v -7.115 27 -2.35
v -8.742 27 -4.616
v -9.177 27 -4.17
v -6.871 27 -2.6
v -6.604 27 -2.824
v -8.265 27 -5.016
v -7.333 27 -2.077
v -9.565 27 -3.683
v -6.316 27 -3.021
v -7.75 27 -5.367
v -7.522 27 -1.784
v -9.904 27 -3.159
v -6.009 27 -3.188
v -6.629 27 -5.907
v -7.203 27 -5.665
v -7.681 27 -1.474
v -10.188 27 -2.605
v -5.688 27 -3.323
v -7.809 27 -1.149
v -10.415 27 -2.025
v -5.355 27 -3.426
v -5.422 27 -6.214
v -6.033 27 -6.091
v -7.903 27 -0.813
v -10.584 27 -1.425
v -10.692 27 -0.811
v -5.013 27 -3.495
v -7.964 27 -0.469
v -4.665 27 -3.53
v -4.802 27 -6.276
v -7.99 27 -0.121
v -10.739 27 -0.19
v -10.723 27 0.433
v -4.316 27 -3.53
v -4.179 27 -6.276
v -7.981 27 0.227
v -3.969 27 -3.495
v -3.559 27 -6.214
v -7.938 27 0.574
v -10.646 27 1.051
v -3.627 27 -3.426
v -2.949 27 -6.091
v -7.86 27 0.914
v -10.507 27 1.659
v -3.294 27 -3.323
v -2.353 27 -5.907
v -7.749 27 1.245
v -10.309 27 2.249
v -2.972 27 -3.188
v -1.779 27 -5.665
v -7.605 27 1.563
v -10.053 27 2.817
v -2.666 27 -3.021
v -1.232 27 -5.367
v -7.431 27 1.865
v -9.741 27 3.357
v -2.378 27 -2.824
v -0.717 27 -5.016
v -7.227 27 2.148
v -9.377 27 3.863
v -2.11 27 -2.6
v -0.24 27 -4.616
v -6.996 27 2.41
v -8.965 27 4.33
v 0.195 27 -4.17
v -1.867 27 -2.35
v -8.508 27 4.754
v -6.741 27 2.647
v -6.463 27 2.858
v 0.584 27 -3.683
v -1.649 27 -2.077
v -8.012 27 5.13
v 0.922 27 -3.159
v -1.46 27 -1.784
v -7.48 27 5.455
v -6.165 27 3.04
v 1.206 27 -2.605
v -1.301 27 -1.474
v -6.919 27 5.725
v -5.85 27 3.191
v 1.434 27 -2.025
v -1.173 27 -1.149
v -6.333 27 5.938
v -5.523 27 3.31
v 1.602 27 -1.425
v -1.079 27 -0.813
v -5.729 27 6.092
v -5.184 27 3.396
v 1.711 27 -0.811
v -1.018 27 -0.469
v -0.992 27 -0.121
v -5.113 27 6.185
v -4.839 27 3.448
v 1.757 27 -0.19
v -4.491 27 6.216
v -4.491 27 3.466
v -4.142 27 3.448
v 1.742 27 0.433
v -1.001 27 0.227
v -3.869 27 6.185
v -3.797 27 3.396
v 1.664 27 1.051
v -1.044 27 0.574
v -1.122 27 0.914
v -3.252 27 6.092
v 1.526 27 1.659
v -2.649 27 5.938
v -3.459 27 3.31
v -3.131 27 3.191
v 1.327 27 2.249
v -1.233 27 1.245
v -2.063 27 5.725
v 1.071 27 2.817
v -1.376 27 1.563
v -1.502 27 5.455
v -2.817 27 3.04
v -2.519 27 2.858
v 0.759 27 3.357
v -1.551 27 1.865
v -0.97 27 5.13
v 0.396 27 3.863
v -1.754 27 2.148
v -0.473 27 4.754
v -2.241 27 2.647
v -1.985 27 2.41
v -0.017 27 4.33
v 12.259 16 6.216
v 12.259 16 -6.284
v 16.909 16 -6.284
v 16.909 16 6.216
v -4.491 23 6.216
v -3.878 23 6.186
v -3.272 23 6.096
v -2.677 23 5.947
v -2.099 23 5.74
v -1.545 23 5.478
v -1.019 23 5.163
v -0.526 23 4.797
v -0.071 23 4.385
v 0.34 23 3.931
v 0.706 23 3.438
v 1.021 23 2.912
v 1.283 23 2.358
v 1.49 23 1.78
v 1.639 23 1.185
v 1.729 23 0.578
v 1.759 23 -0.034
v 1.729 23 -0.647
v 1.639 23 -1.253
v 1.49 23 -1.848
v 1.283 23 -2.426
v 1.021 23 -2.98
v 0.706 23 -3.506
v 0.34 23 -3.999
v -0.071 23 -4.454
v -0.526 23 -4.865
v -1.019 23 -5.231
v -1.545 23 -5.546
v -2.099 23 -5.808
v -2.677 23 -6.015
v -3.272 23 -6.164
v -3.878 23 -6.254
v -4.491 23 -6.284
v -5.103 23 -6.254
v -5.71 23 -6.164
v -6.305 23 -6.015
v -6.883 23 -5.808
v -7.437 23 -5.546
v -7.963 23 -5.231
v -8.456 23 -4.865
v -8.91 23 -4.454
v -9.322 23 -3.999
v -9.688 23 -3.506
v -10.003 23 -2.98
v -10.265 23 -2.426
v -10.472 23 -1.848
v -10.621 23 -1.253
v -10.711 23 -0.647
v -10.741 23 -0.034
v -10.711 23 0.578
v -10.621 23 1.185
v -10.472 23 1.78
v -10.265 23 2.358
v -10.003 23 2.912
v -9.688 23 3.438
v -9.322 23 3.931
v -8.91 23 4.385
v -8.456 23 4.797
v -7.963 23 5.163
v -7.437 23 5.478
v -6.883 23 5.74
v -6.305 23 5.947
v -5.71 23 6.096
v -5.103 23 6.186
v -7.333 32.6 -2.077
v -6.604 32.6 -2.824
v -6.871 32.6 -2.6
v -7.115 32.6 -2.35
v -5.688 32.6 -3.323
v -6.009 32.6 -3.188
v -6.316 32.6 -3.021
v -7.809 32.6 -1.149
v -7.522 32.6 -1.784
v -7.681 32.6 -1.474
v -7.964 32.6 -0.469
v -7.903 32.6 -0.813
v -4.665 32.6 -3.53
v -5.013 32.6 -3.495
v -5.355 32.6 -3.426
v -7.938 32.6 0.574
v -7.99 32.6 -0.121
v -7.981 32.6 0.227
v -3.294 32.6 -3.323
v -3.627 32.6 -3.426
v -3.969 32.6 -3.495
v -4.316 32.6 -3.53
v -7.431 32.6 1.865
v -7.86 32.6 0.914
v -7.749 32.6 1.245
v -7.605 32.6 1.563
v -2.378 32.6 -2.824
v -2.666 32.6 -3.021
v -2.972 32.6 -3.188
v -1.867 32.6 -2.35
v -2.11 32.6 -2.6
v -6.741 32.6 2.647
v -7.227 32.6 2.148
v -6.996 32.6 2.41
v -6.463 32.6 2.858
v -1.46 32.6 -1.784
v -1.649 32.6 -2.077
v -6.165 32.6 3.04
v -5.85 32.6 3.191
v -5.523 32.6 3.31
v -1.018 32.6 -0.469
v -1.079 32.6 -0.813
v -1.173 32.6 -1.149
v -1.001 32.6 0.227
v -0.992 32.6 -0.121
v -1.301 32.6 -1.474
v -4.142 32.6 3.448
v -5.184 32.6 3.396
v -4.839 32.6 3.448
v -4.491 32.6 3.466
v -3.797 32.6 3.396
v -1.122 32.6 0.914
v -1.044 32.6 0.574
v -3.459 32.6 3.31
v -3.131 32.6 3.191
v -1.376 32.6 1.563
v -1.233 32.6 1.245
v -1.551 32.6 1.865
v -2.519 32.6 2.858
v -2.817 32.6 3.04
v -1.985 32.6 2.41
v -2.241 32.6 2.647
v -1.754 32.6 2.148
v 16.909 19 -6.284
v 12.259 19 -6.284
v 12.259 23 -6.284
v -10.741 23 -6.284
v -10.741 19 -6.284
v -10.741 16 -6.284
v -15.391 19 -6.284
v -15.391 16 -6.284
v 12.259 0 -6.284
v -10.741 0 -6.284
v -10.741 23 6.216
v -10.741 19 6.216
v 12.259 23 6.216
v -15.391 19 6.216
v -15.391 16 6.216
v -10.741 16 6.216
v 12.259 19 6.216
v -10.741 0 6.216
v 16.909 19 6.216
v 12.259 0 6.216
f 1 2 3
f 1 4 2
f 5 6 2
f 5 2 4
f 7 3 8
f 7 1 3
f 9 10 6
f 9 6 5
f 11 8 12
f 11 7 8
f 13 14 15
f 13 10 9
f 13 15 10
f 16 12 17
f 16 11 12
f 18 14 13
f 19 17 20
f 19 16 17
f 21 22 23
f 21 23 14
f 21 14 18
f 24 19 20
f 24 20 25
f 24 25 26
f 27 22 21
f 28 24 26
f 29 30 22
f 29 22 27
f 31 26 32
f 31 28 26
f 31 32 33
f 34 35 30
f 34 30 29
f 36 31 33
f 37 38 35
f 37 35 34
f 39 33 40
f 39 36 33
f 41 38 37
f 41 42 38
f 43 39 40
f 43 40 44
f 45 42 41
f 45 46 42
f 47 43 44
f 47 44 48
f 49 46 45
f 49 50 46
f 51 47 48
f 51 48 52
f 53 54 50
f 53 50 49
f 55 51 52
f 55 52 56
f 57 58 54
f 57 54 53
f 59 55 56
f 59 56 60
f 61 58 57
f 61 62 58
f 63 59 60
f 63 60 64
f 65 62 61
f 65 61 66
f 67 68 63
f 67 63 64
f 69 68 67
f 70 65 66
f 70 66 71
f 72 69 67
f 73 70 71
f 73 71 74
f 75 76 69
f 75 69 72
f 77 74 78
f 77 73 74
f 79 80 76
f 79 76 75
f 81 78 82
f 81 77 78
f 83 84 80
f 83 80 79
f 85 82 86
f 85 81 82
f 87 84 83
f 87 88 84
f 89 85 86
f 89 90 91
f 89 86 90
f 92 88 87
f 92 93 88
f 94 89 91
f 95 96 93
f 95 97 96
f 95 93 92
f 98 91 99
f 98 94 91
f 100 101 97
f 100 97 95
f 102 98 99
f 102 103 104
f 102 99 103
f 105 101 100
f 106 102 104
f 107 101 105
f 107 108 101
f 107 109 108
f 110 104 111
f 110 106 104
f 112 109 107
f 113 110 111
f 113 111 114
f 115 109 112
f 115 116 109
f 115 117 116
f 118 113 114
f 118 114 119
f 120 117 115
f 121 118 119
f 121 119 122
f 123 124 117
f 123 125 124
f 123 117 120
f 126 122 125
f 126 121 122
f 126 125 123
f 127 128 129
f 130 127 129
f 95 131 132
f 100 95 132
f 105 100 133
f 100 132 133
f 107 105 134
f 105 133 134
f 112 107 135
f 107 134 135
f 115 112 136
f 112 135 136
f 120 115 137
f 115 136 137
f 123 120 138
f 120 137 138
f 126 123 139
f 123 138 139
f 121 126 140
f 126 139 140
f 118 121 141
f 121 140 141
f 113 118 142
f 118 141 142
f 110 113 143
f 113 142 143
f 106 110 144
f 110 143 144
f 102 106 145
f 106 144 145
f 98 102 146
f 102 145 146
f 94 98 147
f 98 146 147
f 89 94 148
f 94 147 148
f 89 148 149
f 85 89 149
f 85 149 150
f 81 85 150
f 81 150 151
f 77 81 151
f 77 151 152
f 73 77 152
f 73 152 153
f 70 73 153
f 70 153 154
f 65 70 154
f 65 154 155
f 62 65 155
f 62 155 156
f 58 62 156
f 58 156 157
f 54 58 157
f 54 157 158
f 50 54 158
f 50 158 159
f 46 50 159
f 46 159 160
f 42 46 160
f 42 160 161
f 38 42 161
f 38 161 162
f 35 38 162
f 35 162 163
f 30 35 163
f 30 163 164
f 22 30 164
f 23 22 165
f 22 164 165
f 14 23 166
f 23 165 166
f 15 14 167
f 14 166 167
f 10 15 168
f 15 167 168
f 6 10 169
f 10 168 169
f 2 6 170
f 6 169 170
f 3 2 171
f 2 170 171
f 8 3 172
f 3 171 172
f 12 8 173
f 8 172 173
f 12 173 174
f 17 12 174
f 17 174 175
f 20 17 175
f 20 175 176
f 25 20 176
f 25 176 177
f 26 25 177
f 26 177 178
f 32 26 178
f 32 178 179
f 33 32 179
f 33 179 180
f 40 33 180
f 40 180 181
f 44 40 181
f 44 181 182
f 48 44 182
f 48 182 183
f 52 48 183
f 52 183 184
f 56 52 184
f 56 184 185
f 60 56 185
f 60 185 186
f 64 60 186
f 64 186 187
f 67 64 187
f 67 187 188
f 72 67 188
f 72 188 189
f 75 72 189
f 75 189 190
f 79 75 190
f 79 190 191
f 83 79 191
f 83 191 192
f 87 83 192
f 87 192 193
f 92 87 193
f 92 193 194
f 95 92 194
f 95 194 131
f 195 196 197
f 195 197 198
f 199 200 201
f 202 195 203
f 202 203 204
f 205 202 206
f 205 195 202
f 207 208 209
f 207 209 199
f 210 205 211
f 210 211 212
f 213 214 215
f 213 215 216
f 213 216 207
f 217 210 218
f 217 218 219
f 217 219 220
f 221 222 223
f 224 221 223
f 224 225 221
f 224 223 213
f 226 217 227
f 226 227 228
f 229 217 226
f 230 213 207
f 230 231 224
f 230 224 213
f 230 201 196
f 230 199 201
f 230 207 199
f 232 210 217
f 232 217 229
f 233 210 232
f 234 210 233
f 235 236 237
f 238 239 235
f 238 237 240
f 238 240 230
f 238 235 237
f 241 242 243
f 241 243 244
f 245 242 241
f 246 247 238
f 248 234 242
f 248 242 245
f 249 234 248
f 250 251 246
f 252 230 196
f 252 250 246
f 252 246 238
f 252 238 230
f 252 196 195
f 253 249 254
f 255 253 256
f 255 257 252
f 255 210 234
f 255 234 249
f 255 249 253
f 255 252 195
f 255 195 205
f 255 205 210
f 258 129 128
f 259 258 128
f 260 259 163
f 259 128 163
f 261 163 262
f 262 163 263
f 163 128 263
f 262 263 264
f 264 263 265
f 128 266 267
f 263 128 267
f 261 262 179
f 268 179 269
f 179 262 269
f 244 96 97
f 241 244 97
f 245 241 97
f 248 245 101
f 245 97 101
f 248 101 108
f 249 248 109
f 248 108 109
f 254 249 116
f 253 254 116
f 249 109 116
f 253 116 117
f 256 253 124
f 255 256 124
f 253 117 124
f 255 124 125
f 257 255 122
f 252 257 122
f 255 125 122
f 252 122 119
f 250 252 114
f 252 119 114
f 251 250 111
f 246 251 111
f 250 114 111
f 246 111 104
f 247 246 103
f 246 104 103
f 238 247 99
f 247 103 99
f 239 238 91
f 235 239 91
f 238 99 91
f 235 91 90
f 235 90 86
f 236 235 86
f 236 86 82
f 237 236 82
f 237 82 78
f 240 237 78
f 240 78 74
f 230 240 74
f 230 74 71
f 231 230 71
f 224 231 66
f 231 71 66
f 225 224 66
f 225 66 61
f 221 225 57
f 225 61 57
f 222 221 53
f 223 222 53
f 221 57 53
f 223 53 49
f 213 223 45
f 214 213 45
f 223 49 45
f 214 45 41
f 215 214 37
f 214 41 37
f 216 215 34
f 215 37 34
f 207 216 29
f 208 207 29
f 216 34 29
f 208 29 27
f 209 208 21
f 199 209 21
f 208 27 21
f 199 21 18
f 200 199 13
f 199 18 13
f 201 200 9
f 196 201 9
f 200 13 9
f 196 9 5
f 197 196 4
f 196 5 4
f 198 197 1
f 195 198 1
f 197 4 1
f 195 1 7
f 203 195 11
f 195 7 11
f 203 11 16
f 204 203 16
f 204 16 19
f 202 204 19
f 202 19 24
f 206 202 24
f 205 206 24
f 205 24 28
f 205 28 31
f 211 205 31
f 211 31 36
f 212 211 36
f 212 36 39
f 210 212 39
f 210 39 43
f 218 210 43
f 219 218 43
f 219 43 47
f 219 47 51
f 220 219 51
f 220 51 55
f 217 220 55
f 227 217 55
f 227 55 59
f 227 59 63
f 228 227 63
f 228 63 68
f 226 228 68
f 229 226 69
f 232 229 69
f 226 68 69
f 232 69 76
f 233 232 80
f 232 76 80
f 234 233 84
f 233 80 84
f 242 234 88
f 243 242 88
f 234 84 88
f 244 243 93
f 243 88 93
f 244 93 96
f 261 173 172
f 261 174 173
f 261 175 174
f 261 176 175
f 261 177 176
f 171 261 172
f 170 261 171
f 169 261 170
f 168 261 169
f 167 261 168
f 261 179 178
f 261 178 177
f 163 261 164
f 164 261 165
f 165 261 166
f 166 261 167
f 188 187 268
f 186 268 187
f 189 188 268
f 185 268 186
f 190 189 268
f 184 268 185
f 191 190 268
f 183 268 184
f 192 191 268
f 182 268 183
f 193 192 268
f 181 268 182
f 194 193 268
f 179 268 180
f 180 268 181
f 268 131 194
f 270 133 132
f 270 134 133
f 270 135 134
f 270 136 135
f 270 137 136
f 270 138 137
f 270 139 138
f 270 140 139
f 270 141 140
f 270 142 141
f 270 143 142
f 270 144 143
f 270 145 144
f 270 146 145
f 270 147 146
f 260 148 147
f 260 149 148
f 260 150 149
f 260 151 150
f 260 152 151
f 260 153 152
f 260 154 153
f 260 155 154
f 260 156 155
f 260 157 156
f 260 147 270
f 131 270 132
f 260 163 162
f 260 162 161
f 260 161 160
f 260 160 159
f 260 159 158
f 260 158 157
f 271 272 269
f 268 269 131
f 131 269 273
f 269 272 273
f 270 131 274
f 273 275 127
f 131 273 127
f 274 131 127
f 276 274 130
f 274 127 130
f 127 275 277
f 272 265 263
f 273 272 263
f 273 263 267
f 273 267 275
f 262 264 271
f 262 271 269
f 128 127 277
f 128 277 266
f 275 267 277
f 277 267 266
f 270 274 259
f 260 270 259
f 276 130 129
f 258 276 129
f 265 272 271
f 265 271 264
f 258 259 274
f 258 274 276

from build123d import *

# Parameters (mm, degrees)
SKETCH1_R           = 3.5
BOSS_EXTRUDE1_DEPTH = 23
BOSS_EXTRUDE2_START = 16
SKETCH1_3_W         = 4.65
SKETCH1_3_H         = 12.5
BOSS_EXTRUDE2_DEPTH = 3
BOSS_EXTRUDE3_START = 23
SKETCH1_4_R         = 6.25
BOSS_EXTRUDE3_DEPTH = 4
BOSS_EXTRUDE4_START = 27
SKETCH1_5_R         = 3.5
BOSS_EXTRUDE4_DEPTH = 5.6


with BuildPart() as part:
    # Sketch1 → Boss-Extrude1 (new body)
    # profile 1 of 8: a face of its own
    with BuildSketch(Plane(origin=(0, 0, 0), x_dir=(1, 0, 0), z_dir=(0, 1, 0))):
        with BuildLine():
            Line((-4.490881441, 6.284153005), (-10.740881441, 6.284153005))
            Line((-10.740881441, 6.284153005), (-10.740881441, 0.034153005))
            ThreePointArc((-10.740881441, 0.034153005), (-8.910298823, 4.453570388), (-4.490881441, 6.284153005))
        make_face()
    # profile 2 of 8: a face of its own
    with BuildSketch(Plane(origin=(0, 0, 0), x_dir=(1, 0, 0), z_dir=(0, 1, 0))):
        with BuildLine():
            ThreePointArc((0.759118559, 3.425317997), (-1.501925201, 5.523109245), (-4.490881441, 6.284153005))
            ThreePointArc((-4.490881441, 6.284153005), (-8.910298823, 4.453570388), (-10.740881441, 0.034153005))
            ThreePointArc((-10.740881441, 0.034153005), (-8.910298823, -4.385264377), (-4.490881441, -6.215846995))
            ThreePointArc((-4.490881441, -6.215846995), (-1.501925201, -5.454803234), (0.759118559, -3.357011986))
            Line((0.759118559, -3.357011986), (0.759118559, 3.425317997))
        make_face()
        with Locations((-4.490881441, 0.034153005)):
            Circle(SKETCH1_R, mode=Mode.SUBTRACT)
    # profile 3 of 8: a face of its own
    with BuildSketch(Plane(origin=(0, 0, 0), x_dir=(1, 0, 0), z_dir=(0, 1, 0))):
        with BuildLine():
            Line((12.259118559, 6.284153005), (0.759118559, 6.284153005))
            Line((0.759118559, 6.284153005), (0.759118559, 3.425317997))
            ThreePointArc((0.759118559, 3.425317997), (1.503907964, 1.801919958), (1.759118559, 0.034153005))
            ThreePointArc((1.759118559, 0.034153005), (1.503907964, -1.733613948), (0.759118559, -3.357011986))
            Line((0.759118559, -3.357011986), (0.759118559, -6.215846995))
            Line((0.759118559, -6.215846995), (12.259118559, -6.215846995))
            Line((12.259118559, -6.215846995), (12.259118559, 6.284153005))
        make_face()
    # profile 4 of 8: a face of its own
    with BuildSketch(Plane(origin=(0, 0, 0), x_dir=(1, 0, 0), z_dir=(0, 1, 0))):
        with BuildLine():
            ThreePointArc((0.759118559, -3.357011986), (-1.501925201, -5.454803234), (-4.490881441, -6.215846995))
            Line((-4.490881441, -6.215846995), (0.759118559, -6.215846995))
            Line((0.759118559, -6.215846995), (0.759118559, -3.357011986))
        make_face()
    # profile 5 of 8: a face of its own
    with BuildSketch(Plane(origin=(0, 0, 0), x_dir=(1, 0, 0), z_dir=(0, 1, 0))):
        with BuildLine():
            Line((0.759118559, 6.284153005), (-4.490881441, 6.284153005))
            ThreePointArc((-4.490881441, 6.284153005), (-1.501925201, 5.523109245), (0.759118559, 3.425317997))
            Line((0.759118559, 3.425317997), (0.759118559, 6.284153005))
        make_face()
    # profile 6 of 8: a face of its own
    with BuildSketch(Plane(origin=(0, 0, 0), x_dir=(1, 0, 0), z_dir=(0, 1, 0))):
        with BuildLine():
            ThreePointArc((1.759118559, 0.034153005), (1.503907964, 1.801919958), (0.759118559, 3.425317997))
            Line((0.759118559, 3.425317997), (0.759118559, -3.357011986))
            ThreePointArc((0.759118559, -3.357011986), (1.503907964, -1.733613948), (1.759118559, 0.034153005))
        make_face()
    # profile 7 of 8: a face of its own
    with BuildSketch(Plane(origin=(0, 0, 0), x_dir=(1, 0, 0), z_dir=(0, 1, 0))):
        with Locations((-4.490881441, 0.034153005)):
            Circle(SKETCH1_R)
    # profile 8 of 8: a face of its own
    with BuildSketch(Plane(origin=(0, 0, 0), x_dir=(1, 0, 0), z_dir=(0, 1, 0))):
        with BuildLine():
            ThreePointArc((-4.490881441, -6.215846995), (-8.910298823, -4.385264377), (-10.740881441, 0.034153005))
            Line((-10.740881441, 0.034153005), (-10.740881441, -6.215846995))
            Line((-10.740881441, -6.215846995), (-4.490881441, -6.215846995))
        make_face()
    extrude(amount=BOSS_EXTRUDE1_DEPTH)

    # Sketch1<3> → Boss-Extrude2 (add)
    with BuildSketch(Plane(origin=(0, 0, 0), x_dir=(1, 0, 0), z_dir=(0, 1, 0)).offset(BOSS_EXTRUDE2_START)):
        with Locations((-13.065881441, 0.034153005)):
            Rectangle(SKETCH1_3_W, SKETCH1_3_H)
        with Locations((14.584118559, 0.034153005)):
            Rectangle(SKETCH1_3_W, SKETCH1_3_H)
    extrude(amount=BOSS_EXTRUDE2_DEPTH)

    # Sketch1<4> → Boss-Extrude3 (add)
    with BuildSketch(Plane(origin=(0, 0, 0), x_dir=(1, 0, 0), z_dir=(0, 1, 0)).offset(BOSS_EXTRUDE3_START)):
        with Locations(Location((-4.490881441, 0.034153005, 0), (0, 0, 270))):
            Circle(SKETCH1_4_R)
    extrude(amount=BOSS_EXTRUDE3_DEPTH)

    # Sketch1<5> → Boss-Extrude4 (add)
    with BuildSketch(Plane(origin=(0, 0, 0), x_dir=(1, 0, 0), z_dir=(0, 1, 0)).offset(BOSS_EXTRUDE4_START)):
        with Locations(Location((-4.490881441, 0.034153005, 0), (0, 0, 270))):
            Circle(SKETCH1_5_R)
    extrude(amount=BOSS_EXTRUDE4_DEPTH)


solid = part.part
